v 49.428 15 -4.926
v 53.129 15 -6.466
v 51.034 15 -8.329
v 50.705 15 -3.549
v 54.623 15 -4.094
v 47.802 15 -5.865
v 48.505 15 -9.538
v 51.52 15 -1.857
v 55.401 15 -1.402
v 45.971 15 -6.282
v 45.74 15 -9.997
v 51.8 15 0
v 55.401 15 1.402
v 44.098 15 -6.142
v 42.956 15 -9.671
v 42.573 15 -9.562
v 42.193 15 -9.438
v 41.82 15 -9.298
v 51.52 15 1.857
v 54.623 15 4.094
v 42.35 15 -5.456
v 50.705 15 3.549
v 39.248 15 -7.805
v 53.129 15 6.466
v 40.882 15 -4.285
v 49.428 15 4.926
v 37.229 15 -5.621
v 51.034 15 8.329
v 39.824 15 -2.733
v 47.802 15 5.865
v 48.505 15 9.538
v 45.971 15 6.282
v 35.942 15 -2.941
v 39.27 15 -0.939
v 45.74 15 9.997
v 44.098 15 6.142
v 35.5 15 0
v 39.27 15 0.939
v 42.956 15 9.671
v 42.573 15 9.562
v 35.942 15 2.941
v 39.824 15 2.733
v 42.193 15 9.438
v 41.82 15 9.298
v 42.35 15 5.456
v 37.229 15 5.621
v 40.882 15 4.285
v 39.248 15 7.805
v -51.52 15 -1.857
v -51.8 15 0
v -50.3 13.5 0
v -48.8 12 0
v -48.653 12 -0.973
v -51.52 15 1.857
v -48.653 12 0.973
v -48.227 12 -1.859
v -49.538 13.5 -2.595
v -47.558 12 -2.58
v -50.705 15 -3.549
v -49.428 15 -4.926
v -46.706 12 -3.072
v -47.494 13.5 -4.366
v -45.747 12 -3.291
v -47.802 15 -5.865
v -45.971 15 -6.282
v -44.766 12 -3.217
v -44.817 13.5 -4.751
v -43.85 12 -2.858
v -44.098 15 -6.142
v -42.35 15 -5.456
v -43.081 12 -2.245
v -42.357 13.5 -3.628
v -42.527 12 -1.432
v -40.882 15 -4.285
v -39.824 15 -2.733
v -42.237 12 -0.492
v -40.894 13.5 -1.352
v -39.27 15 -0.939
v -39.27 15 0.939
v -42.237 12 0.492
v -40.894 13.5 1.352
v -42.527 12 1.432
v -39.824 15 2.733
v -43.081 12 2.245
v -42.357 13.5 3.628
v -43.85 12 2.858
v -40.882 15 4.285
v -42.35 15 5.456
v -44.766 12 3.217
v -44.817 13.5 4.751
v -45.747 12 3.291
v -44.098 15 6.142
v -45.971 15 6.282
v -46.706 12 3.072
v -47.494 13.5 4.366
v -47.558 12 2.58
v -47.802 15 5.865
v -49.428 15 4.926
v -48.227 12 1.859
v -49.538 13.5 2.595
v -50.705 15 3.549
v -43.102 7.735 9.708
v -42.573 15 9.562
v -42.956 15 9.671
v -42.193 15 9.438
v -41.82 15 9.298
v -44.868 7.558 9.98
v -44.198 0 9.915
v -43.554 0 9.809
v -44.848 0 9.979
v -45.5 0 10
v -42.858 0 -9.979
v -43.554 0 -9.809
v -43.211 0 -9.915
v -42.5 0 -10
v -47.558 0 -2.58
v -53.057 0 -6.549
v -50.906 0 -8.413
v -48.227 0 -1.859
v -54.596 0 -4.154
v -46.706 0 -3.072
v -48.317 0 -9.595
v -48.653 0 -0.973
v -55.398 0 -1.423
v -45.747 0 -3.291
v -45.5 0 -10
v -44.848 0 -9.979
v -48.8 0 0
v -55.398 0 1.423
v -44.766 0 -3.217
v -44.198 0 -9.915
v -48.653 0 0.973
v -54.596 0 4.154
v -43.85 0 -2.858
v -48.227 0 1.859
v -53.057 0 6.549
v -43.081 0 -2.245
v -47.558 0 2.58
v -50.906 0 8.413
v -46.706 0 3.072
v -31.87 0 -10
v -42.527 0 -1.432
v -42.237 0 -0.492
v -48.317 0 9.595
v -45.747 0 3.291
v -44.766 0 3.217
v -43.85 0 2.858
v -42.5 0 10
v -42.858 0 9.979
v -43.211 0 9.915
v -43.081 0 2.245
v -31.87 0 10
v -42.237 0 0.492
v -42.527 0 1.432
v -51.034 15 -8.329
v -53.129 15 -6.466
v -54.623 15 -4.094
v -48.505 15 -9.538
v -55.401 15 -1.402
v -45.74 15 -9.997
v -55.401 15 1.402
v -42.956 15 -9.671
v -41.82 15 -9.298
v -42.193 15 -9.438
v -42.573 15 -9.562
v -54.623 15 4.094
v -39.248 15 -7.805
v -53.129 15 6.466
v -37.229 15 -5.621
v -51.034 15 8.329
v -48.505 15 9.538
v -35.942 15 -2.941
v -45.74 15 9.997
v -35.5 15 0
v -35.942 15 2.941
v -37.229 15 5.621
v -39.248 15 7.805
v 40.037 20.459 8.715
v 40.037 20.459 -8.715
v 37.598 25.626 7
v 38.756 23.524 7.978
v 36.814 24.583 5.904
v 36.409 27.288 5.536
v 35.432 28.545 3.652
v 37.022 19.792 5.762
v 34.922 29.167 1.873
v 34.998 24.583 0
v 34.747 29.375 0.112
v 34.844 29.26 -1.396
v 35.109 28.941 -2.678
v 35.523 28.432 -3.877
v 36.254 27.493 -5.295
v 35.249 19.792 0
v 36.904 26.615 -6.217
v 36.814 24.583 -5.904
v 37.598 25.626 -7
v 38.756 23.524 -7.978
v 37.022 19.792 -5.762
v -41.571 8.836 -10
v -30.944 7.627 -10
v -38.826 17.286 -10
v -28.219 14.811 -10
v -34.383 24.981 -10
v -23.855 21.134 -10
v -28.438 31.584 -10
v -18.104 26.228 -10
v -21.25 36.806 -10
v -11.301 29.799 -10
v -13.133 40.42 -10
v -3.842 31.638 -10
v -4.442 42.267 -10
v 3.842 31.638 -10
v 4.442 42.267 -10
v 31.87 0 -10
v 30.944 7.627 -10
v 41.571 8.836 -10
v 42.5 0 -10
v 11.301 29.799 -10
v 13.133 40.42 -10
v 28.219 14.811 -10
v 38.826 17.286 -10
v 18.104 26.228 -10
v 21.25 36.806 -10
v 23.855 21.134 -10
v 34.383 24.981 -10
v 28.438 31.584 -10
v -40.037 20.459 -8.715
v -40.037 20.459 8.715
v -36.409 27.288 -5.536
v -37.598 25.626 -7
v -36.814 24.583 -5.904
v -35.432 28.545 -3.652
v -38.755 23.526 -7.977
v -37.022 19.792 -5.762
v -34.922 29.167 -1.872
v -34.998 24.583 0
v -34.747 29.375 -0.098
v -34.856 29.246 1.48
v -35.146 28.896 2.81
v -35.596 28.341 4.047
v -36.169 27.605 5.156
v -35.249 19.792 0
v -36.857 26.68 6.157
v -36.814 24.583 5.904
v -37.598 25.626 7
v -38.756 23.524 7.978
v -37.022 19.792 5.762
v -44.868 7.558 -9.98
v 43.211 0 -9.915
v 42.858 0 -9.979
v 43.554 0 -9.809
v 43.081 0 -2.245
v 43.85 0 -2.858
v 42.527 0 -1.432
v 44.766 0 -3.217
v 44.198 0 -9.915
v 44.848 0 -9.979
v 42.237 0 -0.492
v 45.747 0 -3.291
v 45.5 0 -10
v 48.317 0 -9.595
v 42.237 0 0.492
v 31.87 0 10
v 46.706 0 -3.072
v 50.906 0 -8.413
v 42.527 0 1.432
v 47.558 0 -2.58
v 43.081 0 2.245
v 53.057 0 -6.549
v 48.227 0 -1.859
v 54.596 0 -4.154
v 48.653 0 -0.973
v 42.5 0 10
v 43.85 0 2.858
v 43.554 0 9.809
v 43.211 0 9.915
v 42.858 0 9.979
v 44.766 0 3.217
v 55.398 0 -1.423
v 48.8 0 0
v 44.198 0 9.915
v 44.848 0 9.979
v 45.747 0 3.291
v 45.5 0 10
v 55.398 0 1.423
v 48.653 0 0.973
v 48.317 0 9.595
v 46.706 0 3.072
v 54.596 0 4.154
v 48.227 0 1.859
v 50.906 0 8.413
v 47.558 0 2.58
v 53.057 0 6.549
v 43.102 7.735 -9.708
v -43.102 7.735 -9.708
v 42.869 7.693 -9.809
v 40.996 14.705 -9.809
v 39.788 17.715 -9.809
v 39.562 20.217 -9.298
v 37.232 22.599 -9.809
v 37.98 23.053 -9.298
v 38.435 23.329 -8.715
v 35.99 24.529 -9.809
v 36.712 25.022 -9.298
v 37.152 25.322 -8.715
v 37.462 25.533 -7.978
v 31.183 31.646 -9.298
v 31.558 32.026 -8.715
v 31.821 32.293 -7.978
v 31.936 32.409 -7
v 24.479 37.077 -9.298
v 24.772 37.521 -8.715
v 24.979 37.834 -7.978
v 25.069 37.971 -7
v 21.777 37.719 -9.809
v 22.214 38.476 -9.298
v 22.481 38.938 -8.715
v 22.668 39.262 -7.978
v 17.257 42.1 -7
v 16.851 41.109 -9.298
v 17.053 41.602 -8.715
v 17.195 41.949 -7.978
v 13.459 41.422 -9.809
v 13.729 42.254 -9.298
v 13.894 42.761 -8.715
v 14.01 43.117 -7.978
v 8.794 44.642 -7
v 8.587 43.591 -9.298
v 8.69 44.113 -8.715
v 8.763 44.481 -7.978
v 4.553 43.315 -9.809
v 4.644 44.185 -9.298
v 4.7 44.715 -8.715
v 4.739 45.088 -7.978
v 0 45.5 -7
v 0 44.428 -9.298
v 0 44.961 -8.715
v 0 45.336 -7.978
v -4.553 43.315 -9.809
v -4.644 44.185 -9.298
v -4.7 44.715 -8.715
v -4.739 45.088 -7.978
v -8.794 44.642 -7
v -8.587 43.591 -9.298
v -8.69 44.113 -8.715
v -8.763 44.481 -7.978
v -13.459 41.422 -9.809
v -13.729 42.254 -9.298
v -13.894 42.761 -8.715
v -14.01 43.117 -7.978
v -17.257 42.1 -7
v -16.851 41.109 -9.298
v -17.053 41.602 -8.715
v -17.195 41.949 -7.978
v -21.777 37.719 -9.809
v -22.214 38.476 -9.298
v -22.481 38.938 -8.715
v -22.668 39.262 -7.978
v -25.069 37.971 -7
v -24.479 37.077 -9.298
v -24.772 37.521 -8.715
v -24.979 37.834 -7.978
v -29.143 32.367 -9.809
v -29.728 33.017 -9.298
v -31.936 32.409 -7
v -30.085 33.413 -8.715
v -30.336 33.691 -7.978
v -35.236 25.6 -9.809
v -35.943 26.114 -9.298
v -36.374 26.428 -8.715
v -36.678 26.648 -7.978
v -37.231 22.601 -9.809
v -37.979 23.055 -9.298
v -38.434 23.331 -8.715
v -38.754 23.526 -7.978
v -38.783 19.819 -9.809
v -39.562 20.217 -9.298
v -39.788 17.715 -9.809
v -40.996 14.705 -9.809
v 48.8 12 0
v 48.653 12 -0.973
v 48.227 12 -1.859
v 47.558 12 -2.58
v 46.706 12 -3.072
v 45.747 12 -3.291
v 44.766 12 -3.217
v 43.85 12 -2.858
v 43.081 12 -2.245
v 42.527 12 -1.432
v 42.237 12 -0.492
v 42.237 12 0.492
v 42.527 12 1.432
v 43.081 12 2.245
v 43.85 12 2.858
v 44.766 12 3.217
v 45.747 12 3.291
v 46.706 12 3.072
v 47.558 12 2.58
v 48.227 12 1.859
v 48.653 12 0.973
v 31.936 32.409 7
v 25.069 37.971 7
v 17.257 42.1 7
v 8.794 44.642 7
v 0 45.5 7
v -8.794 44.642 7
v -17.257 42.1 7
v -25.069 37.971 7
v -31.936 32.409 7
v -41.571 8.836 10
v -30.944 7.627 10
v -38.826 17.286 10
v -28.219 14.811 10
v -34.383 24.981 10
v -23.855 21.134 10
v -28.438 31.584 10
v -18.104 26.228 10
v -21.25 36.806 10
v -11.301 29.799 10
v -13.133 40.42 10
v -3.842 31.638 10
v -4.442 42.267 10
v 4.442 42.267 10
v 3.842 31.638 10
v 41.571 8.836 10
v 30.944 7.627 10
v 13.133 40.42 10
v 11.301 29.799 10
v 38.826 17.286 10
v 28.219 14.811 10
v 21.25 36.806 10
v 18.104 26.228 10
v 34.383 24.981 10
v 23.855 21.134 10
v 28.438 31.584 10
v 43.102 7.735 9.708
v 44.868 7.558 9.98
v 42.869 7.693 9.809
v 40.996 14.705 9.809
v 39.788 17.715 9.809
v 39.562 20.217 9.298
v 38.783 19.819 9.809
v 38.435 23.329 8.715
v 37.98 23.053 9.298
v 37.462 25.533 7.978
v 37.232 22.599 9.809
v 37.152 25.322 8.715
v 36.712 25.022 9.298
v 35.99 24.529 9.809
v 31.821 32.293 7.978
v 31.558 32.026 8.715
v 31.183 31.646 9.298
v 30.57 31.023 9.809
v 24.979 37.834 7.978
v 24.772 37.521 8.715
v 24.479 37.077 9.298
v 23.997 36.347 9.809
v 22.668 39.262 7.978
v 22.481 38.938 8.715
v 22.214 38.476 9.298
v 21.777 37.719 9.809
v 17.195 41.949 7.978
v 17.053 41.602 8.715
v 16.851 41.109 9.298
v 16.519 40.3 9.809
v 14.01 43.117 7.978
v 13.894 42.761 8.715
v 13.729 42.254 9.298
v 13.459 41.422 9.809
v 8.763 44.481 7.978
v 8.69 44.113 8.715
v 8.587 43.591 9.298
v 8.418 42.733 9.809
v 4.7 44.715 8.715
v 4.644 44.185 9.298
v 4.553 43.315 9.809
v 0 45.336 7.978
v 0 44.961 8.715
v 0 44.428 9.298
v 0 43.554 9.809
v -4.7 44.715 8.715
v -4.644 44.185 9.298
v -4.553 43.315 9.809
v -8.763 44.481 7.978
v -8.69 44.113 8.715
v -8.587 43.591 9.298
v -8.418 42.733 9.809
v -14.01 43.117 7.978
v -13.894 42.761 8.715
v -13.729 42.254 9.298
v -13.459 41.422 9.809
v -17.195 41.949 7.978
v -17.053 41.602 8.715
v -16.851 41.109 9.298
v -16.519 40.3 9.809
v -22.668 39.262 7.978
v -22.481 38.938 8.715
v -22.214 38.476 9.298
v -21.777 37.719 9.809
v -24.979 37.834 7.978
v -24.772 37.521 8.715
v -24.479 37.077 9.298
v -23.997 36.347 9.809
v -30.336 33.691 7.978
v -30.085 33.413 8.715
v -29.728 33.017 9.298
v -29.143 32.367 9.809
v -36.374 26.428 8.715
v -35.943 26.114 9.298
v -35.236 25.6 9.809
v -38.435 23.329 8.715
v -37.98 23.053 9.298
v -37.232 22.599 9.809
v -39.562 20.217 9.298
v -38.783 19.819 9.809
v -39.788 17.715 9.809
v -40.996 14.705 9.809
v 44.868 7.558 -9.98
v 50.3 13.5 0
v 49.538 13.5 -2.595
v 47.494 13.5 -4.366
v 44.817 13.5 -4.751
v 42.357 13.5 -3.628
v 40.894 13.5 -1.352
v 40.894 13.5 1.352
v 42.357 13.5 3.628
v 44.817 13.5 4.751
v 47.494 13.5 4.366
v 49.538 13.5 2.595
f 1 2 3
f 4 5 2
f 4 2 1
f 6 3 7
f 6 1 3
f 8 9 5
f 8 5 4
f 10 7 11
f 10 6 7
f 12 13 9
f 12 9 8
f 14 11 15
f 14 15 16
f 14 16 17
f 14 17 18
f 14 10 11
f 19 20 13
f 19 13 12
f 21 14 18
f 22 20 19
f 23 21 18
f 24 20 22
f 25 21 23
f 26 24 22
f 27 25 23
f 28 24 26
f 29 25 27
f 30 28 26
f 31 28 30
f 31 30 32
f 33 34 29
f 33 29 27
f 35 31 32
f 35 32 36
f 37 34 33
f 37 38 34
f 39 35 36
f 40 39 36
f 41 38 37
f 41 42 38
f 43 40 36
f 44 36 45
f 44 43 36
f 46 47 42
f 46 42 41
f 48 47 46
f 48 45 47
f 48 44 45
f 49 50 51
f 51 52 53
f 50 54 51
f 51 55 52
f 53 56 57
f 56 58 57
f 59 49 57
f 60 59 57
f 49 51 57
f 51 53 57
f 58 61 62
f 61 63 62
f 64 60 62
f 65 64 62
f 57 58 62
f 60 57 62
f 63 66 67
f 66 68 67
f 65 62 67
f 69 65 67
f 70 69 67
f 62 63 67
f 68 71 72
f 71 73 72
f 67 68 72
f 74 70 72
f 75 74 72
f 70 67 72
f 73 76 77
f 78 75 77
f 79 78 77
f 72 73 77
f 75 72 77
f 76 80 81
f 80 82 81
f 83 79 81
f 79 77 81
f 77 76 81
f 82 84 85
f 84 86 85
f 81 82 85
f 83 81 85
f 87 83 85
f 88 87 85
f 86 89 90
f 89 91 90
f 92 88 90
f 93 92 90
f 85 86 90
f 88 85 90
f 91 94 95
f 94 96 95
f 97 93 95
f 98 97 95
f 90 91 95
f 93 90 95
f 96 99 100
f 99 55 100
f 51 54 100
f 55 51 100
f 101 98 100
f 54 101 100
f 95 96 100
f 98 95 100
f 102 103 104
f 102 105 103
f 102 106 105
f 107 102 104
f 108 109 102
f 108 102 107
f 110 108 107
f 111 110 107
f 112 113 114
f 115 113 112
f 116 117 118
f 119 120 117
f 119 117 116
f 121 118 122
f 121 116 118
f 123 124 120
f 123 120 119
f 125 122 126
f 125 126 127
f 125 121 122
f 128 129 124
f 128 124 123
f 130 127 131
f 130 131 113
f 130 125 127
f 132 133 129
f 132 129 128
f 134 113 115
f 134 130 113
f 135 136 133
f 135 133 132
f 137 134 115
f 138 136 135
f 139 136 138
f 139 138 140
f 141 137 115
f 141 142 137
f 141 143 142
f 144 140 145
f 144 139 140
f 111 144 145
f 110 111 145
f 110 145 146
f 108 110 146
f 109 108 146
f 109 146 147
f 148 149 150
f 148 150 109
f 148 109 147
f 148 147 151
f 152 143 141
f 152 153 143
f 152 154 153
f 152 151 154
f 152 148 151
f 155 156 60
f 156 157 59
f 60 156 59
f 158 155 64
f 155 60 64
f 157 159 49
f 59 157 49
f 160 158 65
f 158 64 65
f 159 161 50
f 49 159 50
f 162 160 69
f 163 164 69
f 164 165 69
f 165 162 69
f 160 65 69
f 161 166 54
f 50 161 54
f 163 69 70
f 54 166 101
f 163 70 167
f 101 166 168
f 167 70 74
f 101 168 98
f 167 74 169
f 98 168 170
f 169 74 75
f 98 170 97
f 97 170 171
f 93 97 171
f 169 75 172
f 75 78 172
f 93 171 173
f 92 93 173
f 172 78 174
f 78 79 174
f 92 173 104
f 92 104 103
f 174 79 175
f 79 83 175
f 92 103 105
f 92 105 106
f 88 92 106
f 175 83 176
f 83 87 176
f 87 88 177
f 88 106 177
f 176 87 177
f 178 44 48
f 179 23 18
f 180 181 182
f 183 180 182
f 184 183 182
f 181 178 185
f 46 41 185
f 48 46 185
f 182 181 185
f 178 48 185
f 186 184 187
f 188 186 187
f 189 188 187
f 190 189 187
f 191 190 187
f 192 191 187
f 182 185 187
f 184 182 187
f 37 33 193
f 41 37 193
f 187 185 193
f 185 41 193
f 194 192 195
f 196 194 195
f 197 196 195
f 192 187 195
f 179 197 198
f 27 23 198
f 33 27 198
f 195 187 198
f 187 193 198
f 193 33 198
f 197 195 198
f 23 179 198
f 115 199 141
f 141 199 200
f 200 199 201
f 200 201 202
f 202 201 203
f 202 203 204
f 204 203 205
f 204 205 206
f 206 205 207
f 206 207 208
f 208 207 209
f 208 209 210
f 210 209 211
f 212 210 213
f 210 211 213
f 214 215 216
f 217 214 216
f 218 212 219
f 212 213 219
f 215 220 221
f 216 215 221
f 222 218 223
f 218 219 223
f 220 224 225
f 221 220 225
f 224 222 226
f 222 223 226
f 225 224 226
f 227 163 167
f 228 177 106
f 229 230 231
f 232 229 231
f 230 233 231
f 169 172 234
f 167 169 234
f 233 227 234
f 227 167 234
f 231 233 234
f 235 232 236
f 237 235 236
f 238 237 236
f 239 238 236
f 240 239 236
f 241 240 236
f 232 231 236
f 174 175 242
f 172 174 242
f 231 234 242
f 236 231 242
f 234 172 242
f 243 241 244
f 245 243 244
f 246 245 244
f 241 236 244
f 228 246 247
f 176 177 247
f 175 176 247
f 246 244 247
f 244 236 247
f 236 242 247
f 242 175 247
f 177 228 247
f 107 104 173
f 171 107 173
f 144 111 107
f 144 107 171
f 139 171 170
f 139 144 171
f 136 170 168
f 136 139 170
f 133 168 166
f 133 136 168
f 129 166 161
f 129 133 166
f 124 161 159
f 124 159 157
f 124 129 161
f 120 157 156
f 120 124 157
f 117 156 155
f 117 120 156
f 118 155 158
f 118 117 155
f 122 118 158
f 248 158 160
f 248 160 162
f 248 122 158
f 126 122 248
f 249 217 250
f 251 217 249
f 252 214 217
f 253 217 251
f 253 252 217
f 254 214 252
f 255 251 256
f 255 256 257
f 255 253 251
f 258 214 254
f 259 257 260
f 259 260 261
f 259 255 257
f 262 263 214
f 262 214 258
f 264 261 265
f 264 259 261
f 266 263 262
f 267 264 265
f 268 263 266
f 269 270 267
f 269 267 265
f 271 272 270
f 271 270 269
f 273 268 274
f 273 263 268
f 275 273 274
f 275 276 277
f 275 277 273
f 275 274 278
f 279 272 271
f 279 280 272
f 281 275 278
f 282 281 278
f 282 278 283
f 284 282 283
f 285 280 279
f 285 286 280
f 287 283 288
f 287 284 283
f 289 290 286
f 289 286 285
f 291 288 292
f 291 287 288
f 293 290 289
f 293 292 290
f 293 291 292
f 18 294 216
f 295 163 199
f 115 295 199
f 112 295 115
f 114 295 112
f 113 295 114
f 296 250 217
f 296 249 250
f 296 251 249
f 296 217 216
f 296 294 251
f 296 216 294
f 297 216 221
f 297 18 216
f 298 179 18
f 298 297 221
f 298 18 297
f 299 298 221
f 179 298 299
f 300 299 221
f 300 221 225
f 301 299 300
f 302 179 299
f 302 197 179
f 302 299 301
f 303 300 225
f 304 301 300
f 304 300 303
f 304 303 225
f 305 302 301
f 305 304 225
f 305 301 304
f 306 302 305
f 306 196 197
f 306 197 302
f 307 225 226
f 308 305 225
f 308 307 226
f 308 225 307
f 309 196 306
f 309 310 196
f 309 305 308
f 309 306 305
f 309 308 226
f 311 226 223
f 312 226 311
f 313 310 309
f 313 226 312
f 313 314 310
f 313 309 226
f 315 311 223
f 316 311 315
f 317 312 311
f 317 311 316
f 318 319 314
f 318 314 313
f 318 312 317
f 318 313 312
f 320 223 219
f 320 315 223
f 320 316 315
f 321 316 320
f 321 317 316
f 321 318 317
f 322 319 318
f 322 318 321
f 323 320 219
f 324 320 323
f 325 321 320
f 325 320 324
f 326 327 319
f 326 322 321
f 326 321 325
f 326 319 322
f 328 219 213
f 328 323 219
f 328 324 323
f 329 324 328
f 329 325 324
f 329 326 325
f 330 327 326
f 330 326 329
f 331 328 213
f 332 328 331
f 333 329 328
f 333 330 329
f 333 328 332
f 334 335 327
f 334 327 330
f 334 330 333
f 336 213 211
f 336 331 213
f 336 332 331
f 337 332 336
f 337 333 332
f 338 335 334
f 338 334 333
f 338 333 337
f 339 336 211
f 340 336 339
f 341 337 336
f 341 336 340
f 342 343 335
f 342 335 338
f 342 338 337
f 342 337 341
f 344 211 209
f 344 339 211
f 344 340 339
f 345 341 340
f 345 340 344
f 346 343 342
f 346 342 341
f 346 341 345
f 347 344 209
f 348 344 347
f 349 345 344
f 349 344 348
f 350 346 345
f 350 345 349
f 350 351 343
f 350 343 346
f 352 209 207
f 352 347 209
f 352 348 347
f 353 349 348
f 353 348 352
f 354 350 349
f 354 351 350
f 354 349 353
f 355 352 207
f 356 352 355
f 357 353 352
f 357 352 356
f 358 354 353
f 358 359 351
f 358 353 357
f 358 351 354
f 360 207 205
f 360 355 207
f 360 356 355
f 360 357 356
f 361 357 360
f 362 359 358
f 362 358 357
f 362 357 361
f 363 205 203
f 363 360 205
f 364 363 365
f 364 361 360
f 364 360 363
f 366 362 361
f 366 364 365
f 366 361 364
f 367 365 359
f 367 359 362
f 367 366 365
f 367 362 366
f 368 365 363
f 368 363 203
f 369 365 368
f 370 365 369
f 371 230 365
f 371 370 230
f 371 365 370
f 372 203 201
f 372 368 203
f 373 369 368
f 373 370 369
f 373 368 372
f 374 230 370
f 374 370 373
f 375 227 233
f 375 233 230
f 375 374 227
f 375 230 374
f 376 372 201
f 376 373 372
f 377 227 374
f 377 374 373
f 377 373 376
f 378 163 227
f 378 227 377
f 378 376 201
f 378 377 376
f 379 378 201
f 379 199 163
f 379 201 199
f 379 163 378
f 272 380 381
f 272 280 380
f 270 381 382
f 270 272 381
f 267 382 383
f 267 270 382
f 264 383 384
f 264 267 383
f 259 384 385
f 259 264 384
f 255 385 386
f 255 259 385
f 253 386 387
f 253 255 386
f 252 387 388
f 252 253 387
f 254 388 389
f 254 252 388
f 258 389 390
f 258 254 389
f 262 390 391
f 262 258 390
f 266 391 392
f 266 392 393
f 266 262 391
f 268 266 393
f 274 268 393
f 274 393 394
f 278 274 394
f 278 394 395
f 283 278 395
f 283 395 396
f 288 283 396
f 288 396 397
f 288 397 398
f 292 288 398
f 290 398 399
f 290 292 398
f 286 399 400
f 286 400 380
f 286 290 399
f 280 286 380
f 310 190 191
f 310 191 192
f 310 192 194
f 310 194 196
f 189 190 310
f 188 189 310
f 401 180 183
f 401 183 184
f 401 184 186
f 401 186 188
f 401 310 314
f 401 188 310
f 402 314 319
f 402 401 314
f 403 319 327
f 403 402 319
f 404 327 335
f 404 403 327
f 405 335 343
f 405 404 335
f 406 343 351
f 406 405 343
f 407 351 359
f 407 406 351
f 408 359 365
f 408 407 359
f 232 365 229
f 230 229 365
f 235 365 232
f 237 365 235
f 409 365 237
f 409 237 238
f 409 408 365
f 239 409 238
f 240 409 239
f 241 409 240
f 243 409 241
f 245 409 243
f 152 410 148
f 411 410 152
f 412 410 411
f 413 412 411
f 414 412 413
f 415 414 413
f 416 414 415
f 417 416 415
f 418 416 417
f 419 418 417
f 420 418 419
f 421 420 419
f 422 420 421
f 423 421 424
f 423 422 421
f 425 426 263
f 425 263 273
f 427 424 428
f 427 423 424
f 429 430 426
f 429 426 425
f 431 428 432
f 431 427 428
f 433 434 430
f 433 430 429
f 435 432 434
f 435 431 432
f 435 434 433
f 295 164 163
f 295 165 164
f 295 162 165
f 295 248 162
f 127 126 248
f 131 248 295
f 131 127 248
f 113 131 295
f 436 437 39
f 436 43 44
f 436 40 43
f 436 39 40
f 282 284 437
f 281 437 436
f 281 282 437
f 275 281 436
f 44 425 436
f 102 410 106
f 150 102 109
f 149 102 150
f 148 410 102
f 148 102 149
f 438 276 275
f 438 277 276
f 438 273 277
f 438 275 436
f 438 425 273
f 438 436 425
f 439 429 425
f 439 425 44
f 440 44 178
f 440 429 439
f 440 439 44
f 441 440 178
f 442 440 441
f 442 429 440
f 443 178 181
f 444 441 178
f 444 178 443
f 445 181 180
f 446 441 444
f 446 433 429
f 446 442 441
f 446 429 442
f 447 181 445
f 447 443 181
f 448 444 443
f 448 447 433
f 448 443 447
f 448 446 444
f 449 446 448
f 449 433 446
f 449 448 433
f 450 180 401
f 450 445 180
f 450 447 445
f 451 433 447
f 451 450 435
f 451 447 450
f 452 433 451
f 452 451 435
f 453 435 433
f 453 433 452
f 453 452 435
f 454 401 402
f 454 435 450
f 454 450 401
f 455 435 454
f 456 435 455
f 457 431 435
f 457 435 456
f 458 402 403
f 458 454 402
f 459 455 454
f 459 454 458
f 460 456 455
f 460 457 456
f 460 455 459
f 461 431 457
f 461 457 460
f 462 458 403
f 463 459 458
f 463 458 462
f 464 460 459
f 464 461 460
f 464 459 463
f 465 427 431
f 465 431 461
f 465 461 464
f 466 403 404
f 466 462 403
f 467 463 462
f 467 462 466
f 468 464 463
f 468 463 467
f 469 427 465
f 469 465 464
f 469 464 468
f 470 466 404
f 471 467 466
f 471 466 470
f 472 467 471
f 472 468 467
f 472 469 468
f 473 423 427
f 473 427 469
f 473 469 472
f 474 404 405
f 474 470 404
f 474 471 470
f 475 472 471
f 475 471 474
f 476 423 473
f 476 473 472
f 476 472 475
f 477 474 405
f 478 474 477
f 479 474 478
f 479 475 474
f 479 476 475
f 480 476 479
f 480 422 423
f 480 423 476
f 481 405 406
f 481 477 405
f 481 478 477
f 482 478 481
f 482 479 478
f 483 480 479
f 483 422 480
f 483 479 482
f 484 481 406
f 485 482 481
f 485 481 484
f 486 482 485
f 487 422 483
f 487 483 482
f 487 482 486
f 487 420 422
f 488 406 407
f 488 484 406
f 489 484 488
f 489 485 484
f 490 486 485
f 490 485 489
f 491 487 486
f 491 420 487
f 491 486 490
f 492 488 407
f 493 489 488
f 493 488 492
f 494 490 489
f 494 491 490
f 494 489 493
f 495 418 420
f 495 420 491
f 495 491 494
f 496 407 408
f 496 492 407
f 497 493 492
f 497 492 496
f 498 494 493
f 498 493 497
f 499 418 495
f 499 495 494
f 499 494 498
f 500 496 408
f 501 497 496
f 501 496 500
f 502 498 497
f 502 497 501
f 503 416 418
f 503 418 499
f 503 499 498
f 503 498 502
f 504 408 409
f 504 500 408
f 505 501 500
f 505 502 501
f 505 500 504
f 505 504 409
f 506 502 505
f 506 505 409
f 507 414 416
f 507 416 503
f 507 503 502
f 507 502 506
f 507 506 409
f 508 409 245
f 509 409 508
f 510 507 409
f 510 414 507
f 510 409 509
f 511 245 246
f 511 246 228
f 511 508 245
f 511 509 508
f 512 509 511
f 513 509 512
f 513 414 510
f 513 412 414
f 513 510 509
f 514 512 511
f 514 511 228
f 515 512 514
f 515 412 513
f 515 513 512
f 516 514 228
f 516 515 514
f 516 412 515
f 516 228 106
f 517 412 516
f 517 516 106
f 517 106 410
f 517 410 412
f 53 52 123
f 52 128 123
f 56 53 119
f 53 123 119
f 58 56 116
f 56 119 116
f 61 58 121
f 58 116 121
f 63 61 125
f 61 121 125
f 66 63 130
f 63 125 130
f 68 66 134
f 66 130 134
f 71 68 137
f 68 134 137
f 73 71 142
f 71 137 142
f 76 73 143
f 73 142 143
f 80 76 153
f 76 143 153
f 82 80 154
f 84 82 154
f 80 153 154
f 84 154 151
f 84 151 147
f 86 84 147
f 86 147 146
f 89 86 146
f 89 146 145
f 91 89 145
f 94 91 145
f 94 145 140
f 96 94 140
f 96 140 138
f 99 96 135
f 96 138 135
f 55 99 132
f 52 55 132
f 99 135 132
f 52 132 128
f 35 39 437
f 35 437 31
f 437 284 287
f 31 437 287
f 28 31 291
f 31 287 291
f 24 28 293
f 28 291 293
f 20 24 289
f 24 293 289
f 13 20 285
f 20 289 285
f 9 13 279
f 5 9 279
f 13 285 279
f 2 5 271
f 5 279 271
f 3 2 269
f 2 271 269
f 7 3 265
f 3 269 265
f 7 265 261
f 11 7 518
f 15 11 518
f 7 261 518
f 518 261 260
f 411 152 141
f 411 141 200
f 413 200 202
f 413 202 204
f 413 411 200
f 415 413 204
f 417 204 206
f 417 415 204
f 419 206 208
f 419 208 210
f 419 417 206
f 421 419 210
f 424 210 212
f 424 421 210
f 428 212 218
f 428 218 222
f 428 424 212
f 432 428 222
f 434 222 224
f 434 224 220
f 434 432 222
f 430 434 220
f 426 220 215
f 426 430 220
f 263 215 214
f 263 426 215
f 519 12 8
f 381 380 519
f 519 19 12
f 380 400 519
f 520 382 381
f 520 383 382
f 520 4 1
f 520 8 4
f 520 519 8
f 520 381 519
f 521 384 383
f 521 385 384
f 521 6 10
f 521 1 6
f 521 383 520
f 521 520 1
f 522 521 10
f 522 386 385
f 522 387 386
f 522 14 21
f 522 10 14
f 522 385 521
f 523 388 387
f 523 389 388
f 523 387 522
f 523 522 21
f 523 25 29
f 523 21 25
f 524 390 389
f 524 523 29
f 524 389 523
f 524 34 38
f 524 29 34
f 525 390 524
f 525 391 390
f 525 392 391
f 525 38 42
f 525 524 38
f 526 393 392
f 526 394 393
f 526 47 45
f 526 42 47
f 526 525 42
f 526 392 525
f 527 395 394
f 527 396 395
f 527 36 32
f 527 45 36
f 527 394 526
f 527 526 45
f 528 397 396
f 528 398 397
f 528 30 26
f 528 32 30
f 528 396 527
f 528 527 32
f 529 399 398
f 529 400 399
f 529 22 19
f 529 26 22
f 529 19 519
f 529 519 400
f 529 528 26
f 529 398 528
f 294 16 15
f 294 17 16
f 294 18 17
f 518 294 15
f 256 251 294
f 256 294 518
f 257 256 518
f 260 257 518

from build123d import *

# Parameters (mm, degrees)
BOSS_EXTRUDE1_DEPTH                             = 10
SKETCH2_R                                       = 10
BOSS_EXTRUDE2_DEPTH                             = 15
CUT_EXTRUDE1_START                              = -15
SKETCH2_2_R                                     = 10
CUT_EXTRUDE1_DEPTH                              = 45
CUT_EXTRUDE1_DRAFT                              = 3
CSK_FOR_M6_FLAT_HEAD_MACHINE_SCREW1_D           = 6.6
CSK_FOR_M6_FLAT_HEAD_MACHINE_SCREW1_CSINK_D     = 12.6
CSK_FOR_M6_FLAT_HEAD_MACHINE_SCREW1_CSINK_ANGLE = 90
MIRROR1_START                                   = -15
MIRROR1_COPY_1_SKETCH_R                         = 10
MIRROR1_COPY_1_DEPTH                            = 45
MIRROR1_COPY_1_DRAFT                            = 3
FILLET1_R                                       = 3


with BuildPart() as part:
    # Sketch1 → Boss-Extrude1 (new, symmetric)
    with BuildSketch(Plane.XY):
        with BuildLine():
            Line((-45.5, 0), (-31.87, 0))
            ThreePointArc((-31.87, 0), (0, 31.87), (31.87, 0))
            Line((31.87, 0), (45.5, 0))
            ThreePointArc((45.5, 0), (0, 45.5), (-45.5, 0))
        make_face()
    extrude(amount=BOSS_EXTRUDE1_DEPTH, both=True)

    # Sketch2 → Boss-Extrude2 (add)
    with BuildSketch(Plane.XZ):
        with Locations((-45.5, 0)):
            Circle(SKETCH2_R)
    boss_extrude2 = extrude(amount=-BOSS_EXTRUDE2_DEPTH)


with BuildPart() as cut_extrude1_tool:
    # Sketch2<2> → Cut-Extrude1 (with draft: the straight prism first)
    with BuildSketch(Plane.XZ.offset(CUT_EXTRUDE1_START)):
        with Locations((-45.5, 0)):
            Circle(SKETCH2_2_R)
    extrude(amount=-CUT_EXTRUDE1_DEPTH)
    # Cut-Extrude1: the draft: its side faces are tilted about the plane it starts from
    cut_extrude1_sides = [cut_extrude1_tool.faces().sort_by_distance(p)[0] for p in [
        (-55.5, 37.5, 0),
    ]]
    draft(cut_extrude1_sides, Plane.XZ.offset(CUT_EXTRUDE1_START), CUT_EXTRUDE1_DRAFT)


with BuildPart() as part_1:
    add(part.part)

    # Cut-Extrude1: cut by cut_extrude1_tool
    add(cut_extrude1_tool.part, mode=Mode.SUBTRACT)

    # CSK for M6 Flat Head Machine Screw1 (through all)
    with Locations(Plane(origin=(0, 15, 0), x_dir=(1, 0, 0), z_dir=(0, 1, 0))):
        with Locations((-45.5, 0)):
            csk_for_m6_flat_head_machine_screw1 = CounterSinkHole(CSK_FOR_M6_FLAT_HEAD_MACHINE_SCREW1_D / 2, CSK_FOR_M6_FLAT_HEAD_MACHINE_SCREW1_CSINK_D / 2, counter_sink_angle=CSK_FOR_M6_FLAT_HEAD_MACHINE_SCREW1_CSINK_ANGLE)

    # Mirror1: Boss-Extrude2, CSK for M6 Flat Head Machine Screw1 across plane
    add(boss_extrude2.mirror(Plane(origin=(0, 0, 0), x_dir=(0, 0, 1), z_dir=(1, 0, 0))))
    add(csk_for_m6_flat_head_machine_screw1.mirror(Plane(origin=(0, 0, 0), x_dir=(0, 0, 1), z_dir=(1, 0, 0))), mode=Mode.SUBTRACT)


with BuildPart() as mirror1_copy_1_tool:
    # Mirror1 copy 1 sketch → Mirror1 copy 1 (with draft: the straight prism first)
    with BuildSketch(Plane(origin=(0, 0, 0), x_dir=(-1, 0, 0), z_dir=(0, -1, 0)).offset(MIRROR1_START)):
        with Locations((-45.5, 0)):
            Circle(MIRROR1_COPY_1_SKETCH_R)
    extrude(amount=-MIRROR1_COPY_1_DEPTH)
    # Mirror1 copy 1: the draft: its side faces are tilted about the plane it starts from
    mirror1_copy_1_sides = [mirror1_copy_1_tool.faces().sort_by_distance(p)[0] for p in [
        (55.5, 37.5, 0),
    ]]
    draft(mirror1_copy_1_sides, Plane(origin=(0, 0, 0), x_dir=(-1, 0, 0), z_dir=(0, -1, 0)).offset(MIRROR1_START), MIRROR1_COPY_1_DRAFT)


with BuildPart() as part_2:
    add(part_1.part)

    # Mirror1 copy 1: cut by mirror1_copy_1_tool
    add(mirror1_copy_1_tool.part, mode=Mode.SUBTRACT)

    # Fillet1
    # the kernel refuses this fillet: 3 mm, written as the material it takes off along each edge
    with BuildSketch(Plane(origin=(0, 0, 10), x_dir=(0.9864018839376206, -0.1643512195400838, 0), z_dir=(-0.1643512195400838, -0.9864018839376206, 0))) as fillet1_piece_1_section:
        with BuildLine():
            CenterArc((45.5 - FILLET1_R, -FILLET1_R), FILLET1_R, 0, 90)
            Line((45.5 - FILLET1_R, 0), (45.5, 0))
            Line((45.5, 0), (45.5, -FILLET1_R))
        make_face()
    fillet1_piece_1 = revolve(axis=Axis((0, 0, 10), (0, 0, 1)), revolution_arc=198.919095152, mode=Mode.PRIVATE)
    fillet1_piece_1 = fillet1_piece_1 - Plane(origin=(-45.5, 9.787690876, 0), x_dir=(1, 0, 0), z_dir=(0, -1, 0)) * Cylinder(10, 182, mode=Mode.PRIVATE)
    fillet1_piece_1 = fillet1_piece_1 - Plane(origin=(45.5, 9.787690876, 0), x_dir=(-1, 0, 0), z_dir=(0, -1, 0)) * Cylinder(10, 182, mode=Mode.PRIVATE)
    add(fillet1_piece_1, mode=Mode.SUBTRACT)
    with BuildSketch(Plane(origin=(0, 0, -10), x_dir=(0.9864018839376206, -0.1643512195400838, 0), z_dir=(-0.1643512195400838, -0.9864018839376206, 0))) as fillet1_piece_2_section:
        with BuildLine():
            CenterArc((45.5 - FILLET1_R, FILLET1_R), FILLET1_R, 270, 90)
            Line((45.5 - FILLET1_R, 0), (45.5, 0))
            Line((45.5, 0), (45.5, FILLET1_R))
        make_face()
    fillet1_piece_2 = revolve(axis=Axis((0, 0, -10), (0, 0, 1)), revolution_arc=198.919095152, mode=Mode.PRIVATE)
    fillet1_piece_2 = fillet1_piece_2 - Plane(origin=(-45.5, 9.787689661, 0), x_dir=(1, 0, 0), z_dir=(0, -1, 0)) * Cylinder(10, 182, mode=Mode.PRIVATE)
    fillet1_piece_2 = fillet1_piece_2 - Plane(origin=(45.5, 9.787689661, 0), x_dir=(-1, 0, 0), z_dir=(0, -1, 0)) * Cylinder(10, 182, mode=Mode.PRIVATE)
    add(fillet1_piece_2, mode=Mode.SUBTRACT)


solid = part_2.part
